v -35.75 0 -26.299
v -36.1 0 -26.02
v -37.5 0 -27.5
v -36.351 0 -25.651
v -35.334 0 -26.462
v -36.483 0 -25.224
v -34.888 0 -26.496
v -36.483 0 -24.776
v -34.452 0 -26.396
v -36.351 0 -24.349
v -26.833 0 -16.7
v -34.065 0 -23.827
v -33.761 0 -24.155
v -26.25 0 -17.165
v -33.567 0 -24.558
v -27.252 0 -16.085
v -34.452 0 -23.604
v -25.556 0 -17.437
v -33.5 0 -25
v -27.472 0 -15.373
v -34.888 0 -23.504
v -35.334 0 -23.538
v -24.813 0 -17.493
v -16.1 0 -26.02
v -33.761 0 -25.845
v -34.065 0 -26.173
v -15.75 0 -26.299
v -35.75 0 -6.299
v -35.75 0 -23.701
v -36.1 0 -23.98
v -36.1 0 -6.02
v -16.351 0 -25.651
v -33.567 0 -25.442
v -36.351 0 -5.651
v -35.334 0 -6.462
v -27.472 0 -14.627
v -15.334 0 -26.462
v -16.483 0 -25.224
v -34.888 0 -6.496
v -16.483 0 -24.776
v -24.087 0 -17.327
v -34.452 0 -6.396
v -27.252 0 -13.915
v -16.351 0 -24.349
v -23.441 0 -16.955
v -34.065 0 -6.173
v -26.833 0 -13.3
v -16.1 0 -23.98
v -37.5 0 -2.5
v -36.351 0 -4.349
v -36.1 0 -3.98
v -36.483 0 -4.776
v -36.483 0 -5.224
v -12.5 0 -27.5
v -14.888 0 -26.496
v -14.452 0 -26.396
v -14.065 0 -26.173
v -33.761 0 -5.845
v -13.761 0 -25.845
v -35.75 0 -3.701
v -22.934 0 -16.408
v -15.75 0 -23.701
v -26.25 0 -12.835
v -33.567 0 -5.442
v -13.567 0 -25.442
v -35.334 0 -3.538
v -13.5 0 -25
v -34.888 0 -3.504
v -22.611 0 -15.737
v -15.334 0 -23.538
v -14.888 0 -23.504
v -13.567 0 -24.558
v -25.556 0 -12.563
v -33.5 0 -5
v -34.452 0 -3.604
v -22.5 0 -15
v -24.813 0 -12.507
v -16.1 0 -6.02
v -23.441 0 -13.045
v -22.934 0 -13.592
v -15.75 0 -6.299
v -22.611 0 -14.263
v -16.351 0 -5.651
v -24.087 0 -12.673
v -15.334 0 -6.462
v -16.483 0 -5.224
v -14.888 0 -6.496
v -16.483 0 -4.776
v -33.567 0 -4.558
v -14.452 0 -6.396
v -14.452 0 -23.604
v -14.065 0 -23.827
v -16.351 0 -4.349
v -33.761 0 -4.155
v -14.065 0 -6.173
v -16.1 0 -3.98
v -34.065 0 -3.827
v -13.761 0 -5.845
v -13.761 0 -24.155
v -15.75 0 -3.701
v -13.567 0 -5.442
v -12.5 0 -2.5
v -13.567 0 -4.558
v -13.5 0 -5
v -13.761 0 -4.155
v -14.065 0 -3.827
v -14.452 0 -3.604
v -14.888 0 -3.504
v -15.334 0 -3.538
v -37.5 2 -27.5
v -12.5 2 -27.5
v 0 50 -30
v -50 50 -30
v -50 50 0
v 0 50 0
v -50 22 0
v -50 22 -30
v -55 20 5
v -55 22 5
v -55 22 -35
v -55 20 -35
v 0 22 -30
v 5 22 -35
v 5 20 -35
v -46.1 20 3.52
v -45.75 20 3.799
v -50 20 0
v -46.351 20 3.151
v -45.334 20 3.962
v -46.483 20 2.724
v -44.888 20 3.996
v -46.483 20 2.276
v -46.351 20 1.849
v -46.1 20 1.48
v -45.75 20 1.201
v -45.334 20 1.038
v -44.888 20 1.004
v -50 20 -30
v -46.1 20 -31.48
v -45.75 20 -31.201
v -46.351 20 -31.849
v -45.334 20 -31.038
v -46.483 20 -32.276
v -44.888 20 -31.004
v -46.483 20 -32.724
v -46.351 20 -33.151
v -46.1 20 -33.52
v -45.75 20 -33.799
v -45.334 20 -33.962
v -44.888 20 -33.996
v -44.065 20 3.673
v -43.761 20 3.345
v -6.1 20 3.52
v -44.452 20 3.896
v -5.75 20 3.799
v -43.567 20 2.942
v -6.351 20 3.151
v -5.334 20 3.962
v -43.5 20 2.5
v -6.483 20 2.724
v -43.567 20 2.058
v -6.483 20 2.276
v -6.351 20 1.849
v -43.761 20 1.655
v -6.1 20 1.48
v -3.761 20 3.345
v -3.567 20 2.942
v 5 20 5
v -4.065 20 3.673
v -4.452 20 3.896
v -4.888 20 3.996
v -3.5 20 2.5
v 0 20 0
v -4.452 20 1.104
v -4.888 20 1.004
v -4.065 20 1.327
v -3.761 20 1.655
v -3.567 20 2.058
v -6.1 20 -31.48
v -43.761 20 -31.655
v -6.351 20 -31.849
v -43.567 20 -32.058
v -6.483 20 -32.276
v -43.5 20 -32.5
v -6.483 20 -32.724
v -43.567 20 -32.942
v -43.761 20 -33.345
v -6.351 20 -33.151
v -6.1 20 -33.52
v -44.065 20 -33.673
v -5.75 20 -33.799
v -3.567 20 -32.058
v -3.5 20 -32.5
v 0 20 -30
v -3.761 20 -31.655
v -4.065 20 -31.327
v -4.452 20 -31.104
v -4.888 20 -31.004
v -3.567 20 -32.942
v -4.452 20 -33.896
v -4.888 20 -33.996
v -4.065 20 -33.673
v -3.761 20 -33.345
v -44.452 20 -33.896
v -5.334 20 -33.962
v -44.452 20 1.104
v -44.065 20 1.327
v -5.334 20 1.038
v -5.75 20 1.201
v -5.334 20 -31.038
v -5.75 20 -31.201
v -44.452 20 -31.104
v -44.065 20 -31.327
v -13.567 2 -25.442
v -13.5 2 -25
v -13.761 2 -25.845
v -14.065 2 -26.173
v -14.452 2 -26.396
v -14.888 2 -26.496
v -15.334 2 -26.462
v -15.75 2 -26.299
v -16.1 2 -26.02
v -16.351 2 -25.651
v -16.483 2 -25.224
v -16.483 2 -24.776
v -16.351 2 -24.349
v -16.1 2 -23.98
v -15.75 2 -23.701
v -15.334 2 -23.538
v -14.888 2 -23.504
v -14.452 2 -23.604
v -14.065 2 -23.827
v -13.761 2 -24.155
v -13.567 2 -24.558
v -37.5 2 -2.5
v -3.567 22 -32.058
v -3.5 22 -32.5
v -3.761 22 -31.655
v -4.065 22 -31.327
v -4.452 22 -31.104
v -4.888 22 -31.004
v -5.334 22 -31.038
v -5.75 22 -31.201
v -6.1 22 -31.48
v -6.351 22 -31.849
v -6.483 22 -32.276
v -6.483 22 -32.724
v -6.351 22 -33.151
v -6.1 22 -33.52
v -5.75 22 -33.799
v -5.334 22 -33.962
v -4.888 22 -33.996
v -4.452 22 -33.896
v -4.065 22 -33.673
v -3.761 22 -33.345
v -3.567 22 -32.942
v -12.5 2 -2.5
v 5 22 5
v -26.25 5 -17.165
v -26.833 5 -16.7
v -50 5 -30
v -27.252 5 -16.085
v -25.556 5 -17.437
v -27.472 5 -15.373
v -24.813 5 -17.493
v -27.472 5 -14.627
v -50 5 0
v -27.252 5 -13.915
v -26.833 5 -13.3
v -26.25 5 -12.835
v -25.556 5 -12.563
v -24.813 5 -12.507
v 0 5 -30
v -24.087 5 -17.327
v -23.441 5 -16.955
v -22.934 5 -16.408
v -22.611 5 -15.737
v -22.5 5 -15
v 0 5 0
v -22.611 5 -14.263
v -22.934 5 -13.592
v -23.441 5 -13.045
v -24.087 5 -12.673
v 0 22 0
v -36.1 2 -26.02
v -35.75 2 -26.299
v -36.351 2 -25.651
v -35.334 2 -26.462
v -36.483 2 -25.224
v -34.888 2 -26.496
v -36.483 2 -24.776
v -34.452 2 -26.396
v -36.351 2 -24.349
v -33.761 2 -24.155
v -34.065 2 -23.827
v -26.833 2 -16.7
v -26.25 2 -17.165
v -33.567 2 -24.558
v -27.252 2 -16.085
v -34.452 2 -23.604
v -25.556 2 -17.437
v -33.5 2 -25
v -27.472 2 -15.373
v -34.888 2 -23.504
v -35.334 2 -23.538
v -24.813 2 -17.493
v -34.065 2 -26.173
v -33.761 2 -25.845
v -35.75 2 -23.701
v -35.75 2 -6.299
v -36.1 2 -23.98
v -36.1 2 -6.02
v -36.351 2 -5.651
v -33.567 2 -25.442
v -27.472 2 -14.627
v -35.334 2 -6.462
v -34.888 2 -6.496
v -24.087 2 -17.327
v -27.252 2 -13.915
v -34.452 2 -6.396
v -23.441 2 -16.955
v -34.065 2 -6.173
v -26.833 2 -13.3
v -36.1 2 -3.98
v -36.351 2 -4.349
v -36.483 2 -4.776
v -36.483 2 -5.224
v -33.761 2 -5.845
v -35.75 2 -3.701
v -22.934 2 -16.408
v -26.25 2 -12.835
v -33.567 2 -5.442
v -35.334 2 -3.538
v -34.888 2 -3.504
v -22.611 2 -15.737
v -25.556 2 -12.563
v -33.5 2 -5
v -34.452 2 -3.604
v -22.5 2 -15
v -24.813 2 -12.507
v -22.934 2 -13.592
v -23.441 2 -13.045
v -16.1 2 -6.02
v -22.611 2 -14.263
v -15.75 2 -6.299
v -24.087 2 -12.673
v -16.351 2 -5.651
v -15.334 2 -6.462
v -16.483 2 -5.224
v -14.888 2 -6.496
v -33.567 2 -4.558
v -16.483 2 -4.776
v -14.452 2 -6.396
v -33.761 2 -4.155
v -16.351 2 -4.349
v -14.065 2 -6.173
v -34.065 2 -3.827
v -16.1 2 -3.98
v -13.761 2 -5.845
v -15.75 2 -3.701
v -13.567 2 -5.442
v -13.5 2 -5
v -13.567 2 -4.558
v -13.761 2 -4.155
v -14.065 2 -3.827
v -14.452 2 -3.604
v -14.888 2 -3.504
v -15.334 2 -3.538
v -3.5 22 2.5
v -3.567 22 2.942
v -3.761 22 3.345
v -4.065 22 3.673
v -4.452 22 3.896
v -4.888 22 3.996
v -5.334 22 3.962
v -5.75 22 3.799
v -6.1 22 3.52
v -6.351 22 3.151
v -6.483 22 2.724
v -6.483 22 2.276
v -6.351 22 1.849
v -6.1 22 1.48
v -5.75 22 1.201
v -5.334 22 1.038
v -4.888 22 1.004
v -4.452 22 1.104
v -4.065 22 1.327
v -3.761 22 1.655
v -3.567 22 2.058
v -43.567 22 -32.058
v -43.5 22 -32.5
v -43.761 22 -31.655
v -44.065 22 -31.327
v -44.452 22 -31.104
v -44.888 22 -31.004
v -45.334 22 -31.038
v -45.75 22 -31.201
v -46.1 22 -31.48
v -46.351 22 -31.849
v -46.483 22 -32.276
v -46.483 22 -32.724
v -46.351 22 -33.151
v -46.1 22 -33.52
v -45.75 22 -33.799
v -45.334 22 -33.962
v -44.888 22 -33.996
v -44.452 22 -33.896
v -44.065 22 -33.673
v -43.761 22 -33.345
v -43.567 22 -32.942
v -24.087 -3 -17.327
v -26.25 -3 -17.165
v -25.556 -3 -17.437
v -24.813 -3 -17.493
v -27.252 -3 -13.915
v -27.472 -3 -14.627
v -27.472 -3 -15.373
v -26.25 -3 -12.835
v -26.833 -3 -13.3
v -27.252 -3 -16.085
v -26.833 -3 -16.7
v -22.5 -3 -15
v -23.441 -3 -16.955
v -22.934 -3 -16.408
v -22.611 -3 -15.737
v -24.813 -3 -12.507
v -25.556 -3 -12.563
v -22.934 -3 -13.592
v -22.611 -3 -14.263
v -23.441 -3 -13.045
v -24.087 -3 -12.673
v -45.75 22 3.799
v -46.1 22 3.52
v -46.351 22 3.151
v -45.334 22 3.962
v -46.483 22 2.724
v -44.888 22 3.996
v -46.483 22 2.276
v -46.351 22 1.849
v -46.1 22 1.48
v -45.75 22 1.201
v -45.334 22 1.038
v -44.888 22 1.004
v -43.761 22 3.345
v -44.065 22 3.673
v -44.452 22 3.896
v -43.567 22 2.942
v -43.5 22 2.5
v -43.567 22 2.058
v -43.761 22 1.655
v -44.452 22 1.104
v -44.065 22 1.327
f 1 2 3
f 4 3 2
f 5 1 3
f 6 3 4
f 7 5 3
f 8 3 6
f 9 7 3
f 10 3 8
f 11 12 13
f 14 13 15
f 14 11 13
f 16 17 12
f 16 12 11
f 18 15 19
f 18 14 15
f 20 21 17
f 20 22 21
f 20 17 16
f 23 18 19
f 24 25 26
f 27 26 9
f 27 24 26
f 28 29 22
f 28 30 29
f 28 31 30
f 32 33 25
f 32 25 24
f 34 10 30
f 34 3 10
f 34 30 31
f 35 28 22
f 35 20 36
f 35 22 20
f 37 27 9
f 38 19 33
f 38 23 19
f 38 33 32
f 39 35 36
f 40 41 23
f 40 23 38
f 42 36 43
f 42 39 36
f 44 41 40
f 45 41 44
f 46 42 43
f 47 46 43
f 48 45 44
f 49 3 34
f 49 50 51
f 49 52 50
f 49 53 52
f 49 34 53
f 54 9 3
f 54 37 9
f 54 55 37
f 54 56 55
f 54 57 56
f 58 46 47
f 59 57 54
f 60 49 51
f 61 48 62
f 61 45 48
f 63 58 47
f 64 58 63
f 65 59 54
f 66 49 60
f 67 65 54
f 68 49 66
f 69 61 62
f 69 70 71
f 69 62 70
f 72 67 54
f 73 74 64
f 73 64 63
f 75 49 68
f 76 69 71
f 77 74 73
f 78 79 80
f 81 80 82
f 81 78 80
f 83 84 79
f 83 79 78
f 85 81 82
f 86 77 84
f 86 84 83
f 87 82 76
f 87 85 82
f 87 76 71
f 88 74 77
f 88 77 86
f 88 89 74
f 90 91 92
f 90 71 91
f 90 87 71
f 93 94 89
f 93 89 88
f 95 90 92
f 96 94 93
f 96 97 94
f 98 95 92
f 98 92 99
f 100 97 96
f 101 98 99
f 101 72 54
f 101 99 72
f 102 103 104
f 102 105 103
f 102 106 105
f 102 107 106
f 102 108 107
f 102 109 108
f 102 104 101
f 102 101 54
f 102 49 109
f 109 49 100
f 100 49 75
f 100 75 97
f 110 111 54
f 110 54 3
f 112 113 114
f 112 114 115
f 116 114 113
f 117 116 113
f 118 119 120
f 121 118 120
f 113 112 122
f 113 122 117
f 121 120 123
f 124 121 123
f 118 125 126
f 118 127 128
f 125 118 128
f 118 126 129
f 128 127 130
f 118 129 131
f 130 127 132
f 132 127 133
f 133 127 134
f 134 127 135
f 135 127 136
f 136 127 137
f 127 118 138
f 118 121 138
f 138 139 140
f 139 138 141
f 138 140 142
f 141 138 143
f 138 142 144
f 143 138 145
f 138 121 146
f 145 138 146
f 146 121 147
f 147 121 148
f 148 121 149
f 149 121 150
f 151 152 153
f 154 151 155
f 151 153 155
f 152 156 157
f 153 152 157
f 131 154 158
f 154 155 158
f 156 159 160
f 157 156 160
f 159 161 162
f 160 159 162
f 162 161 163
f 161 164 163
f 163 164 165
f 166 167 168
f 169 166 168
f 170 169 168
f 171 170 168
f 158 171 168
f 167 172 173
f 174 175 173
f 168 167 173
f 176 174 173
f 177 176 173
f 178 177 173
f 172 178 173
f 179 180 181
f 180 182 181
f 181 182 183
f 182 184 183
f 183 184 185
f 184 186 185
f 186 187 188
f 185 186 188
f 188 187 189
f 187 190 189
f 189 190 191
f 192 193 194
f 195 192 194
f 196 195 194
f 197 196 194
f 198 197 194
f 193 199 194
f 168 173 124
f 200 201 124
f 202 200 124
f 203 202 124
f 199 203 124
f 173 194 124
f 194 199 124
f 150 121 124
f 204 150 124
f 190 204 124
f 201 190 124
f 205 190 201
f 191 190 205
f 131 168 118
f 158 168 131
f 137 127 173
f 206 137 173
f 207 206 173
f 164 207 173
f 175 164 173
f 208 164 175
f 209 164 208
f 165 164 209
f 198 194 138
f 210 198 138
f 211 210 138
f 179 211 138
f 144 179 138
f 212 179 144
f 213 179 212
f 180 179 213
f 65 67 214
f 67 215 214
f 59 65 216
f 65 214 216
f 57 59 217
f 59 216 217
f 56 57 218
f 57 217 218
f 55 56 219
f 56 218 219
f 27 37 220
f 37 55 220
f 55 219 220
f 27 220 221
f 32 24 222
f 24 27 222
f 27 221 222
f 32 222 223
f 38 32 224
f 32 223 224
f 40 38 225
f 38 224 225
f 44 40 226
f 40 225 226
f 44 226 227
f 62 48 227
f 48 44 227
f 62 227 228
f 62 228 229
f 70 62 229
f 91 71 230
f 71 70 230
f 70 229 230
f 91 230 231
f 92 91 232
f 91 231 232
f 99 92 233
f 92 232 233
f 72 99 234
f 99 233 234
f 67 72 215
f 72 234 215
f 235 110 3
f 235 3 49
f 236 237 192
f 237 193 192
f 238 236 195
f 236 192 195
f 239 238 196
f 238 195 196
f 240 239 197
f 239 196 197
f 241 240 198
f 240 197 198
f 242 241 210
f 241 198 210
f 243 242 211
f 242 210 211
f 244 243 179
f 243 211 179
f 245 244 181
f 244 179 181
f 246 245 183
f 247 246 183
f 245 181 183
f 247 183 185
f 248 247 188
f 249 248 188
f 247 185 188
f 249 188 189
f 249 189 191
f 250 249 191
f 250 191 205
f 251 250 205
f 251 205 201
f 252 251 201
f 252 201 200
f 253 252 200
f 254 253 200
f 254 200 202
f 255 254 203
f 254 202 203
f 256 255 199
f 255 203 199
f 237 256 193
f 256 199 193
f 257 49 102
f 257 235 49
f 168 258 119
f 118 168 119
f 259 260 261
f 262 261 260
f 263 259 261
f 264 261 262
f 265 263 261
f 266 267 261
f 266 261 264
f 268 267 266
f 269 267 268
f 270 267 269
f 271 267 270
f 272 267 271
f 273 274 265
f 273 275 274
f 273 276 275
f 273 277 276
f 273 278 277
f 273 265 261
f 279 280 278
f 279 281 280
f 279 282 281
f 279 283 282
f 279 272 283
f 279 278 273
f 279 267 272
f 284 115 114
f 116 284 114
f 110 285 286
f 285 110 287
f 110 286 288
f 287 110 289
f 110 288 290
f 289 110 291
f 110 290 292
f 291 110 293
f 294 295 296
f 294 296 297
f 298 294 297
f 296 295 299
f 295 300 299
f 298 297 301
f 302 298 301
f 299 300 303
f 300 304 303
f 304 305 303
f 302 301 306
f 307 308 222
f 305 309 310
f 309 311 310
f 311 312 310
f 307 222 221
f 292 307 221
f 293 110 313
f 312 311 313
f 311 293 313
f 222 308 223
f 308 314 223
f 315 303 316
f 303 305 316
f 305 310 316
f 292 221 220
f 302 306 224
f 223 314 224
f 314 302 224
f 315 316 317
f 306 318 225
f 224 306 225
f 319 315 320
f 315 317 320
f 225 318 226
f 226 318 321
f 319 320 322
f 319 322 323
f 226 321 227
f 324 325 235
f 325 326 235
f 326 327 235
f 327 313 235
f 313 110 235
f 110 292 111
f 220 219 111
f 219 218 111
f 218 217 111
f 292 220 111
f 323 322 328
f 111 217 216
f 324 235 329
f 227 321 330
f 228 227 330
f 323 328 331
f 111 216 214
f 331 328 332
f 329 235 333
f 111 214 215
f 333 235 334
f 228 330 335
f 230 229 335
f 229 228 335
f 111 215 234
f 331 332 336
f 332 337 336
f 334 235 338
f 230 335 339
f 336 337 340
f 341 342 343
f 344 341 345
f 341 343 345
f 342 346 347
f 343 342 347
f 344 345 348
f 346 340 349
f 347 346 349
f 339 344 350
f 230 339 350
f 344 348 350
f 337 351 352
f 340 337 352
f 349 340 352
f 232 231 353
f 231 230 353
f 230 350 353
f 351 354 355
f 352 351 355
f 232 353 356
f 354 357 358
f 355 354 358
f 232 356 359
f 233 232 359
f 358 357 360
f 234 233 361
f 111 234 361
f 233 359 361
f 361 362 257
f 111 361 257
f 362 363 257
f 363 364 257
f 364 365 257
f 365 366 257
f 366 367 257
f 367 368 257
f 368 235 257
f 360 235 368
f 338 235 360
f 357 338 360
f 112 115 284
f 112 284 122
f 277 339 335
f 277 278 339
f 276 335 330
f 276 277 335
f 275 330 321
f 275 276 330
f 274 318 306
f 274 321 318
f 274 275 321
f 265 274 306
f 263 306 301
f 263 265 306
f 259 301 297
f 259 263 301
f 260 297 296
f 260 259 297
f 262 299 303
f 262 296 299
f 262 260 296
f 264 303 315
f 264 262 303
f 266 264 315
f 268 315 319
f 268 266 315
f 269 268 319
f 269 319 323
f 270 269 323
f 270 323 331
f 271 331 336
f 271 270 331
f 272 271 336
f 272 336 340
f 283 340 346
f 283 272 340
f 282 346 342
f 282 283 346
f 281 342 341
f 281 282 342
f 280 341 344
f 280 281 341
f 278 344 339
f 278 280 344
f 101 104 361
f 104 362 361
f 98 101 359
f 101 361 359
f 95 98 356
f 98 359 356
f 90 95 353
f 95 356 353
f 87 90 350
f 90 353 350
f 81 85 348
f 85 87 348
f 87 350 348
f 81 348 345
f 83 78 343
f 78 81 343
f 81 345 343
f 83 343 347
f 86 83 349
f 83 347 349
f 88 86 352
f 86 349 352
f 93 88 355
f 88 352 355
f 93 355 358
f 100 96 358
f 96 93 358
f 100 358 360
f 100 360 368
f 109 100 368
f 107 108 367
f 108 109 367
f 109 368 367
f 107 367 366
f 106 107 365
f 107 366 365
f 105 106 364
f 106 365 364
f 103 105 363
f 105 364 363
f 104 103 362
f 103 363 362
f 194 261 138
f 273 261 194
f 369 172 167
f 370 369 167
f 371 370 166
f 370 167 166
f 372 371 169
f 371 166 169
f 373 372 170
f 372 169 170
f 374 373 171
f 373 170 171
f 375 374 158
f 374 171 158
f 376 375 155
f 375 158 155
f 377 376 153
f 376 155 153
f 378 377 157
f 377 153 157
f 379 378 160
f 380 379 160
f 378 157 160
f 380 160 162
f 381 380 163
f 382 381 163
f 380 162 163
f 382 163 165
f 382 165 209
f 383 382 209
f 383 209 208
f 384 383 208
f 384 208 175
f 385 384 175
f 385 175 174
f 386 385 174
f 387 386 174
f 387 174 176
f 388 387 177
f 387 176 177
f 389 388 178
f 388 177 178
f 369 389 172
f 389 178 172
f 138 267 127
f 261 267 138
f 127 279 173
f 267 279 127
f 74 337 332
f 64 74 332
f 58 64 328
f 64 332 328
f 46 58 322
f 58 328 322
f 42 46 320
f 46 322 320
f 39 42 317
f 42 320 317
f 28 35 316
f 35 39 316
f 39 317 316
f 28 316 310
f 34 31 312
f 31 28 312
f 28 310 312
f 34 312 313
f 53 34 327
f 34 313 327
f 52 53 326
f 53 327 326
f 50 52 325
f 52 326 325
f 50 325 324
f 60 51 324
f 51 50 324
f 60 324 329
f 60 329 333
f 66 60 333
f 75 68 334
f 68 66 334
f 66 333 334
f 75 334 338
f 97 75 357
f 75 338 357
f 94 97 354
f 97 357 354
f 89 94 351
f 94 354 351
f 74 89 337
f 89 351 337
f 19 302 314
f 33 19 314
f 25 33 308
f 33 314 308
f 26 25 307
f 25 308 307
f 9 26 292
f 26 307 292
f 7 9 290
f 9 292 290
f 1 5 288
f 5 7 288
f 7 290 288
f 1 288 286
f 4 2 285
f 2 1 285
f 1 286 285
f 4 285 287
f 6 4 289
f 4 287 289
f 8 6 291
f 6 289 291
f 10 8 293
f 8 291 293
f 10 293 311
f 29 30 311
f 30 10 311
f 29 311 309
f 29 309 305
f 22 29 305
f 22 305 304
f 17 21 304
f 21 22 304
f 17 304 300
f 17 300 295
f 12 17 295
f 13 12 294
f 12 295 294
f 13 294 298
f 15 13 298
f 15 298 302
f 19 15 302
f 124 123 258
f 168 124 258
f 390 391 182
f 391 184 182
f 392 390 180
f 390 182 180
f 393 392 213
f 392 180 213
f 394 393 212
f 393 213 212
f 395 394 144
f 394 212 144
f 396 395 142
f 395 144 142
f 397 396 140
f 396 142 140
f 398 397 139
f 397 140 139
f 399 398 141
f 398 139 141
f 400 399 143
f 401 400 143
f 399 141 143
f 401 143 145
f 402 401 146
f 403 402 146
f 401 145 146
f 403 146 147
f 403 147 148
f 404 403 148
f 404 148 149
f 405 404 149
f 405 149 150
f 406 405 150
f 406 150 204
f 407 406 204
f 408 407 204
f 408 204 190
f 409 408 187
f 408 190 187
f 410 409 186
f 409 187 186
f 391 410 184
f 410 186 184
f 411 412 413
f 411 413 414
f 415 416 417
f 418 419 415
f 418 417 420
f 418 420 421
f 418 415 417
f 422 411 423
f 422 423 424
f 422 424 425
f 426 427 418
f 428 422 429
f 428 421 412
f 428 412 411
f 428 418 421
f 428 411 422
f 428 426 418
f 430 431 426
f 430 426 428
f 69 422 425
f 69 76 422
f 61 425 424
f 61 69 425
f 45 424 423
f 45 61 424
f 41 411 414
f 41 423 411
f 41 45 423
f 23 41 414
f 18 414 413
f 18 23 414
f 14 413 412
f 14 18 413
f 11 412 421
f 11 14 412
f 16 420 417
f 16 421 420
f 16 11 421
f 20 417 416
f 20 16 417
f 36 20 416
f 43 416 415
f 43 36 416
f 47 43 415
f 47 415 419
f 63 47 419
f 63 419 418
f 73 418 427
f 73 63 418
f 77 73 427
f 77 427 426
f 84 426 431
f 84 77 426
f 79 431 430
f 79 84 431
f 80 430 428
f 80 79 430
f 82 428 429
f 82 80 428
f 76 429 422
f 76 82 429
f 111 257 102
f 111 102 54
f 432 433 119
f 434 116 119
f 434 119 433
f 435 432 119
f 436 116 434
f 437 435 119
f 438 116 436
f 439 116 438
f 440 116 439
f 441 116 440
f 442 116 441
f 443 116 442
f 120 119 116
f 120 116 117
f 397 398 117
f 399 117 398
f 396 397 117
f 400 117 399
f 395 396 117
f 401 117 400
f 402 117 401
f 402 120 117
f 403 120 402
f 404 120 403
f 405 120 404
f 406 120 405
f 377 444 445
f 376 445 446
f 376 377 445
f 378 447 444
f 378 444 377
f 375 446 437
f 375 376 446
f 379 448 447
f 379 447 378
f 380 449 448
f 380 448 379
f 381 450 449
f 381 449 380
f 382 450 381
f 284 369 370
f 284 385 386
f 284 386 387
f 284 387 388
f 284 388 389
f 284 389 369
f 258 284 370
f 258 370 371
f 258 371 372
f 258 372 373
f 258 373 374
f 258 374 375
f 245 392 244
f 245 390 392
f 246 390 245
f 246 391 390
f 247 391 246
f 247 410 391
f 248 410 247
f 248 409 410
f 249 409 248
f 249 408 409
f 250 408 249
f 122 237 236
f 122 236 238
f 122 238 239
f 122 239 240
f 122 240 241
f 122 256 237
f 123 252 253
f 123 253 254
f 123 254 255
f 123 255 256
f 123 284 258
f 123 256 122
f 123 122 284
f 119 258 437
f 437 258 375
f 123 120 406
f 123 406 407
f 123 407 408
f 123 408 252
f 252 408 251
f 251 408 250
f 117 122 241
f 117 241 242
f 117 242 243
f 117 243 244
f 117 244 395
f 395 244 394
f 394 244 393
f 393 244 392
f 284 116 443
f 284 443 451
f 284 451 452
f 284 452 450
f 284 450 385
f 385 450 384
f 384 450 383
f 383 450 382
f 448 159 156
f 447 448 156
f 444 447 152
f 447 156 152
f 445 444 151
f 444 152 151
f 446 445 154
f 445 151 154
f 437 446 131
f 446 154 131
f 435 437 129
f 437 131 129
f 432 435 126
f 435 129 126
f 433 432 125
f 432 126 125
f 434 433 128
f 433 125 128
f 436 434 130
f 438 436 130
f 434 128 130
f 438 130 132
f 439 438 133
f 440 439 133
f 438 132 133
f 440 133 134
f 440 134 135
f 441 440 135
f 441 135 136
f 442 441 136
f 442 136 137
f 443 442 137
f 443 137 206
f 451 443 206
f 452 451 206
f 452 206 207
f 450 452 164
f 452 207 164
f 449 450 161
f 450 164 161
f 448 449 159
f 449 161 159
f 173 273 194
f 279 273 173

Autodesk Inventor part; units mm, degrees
ref_plane "YZ Plane" through (0, 0, 0) normal (1, 0, 0) x (0, 1, 0)
ref_plane "XZ Plane" through (0, 0, 0) normal (0, 1, 0) x (-1, 0, 0)
ref_plane "XY Plane" through (0, 0, 0) normal (0, 0, 1) x (1, 0, 0)
sketch "Sketch1" plane through (0, 0, 0) normal (0, 1, 0) x (-1, 0, 0)
  line L0 (0, 0) -> (50, 0)
  line L1 (50, 0) -> (50, -30)
  line L2 (50, -30) -> (0, -30)
  line L3 (0, -30) -> (0, 0)
  dimension "d0" = 50
  dimension "d1" = 30
extrude "Extrusion1" add sketch "Sketch1" along normal blind 50
sketch "Sketch2" plane through (0, 50, 0) normal (0, 1, 0) x (1, 0, 0)
  line L0 (5, -5) -> (-55, -5)
  line L1 (-55, -5) -> (-55, 35)
  line L2 (-55, 35) -> (5, 35)
  line L3 (5, 35) -> (5, -5)
  point P0 (0, 0)
  dimension "d4" = 60
  dimension "d5" = 40
extrude "Extrusion2" add sketch "Sketch2" against normal blind 30
sketch "Sketch3" plane through (0, 50, 0) normal (0, 1, 0) x (1, 0, 0)
  line L0 (0, 0) -> (0, 30) projected
  line L1 (0, 30) -> (-50, 30) projected
  line L2 (0, 0) -> (-50, 0)
  line L3 (-50, 0) -> (-50, 30)
  line L4 (-50, 30) -> (0, 30)
  line L5 (0, 30) -> (0, 0)
  line L6 (5, -5) -> (-55, -5) projected
  line L7 (-55, -5) -> (-55, 35) projected
  line L8 (5, -5) -> (-55, -5)
  line L9 (-55, -5) -> (-55, 35)
  line L10 (-55, 35) -> (5, 35)
  line L11 (5, 35) -> (5, -5)
  dimension "d8" = 50
  dimension "d9" = 30
extrude "Extrusion3" cut sketch "Sketch3" against normal blind 28
sketch "Sketch4" plane through (0, 0, 0) normal (0, -1, 0) x (1, 0, 0)
  line L0 (-50, 0) -> (0, 0) projected
  line L1 (0, -30) -> (-50, -30) projected
  line L2 (0, 0) -> (-50, 0)
  line L3 (-50, 0) -> (-50, -30)
  line L4 (-50, -30) -> (0, -30)
  line L5 (0, -30) -> (0, 0)
extrude "Extrusion4" cut sketch "Sketch4" against normal blind 5
sketch "Sketch5" plane through (0, 5, 0) normal (0, -1, 0) x (1, 0, 0)
  circle A0 centre (-25, -15) radius 2.5
  point P0 (0, 0)
  dimension "d14" = 5
extrude "Extrusion5" add sketch "Sketch5" along normal blind 3
sketch "Sketch6" plane through (-25, 2, -15) normal (0, -1, 0) x (1, 0, 0)
  line L0 (-12.5, 12.5) -> (12.5, 12.5)
  line L1 (12.5, 12.5) -> (12.5, -12.5)
  line L2 (12.5, -12.5) -> (-12.5, -12.5)
  line L3 (-12.5, -12.5) -> (-12.5, 12.5)
  circle A0 centre (-10, 10) radius 1.5
  circle A1 centre (-10, -10) radius 1.5
  circle A2 centre (10, -10) radius 1.5
  circle A3 centre (10, 10) radius 1.5
  point P0 (25, 15)
  dimension "d19" = 25
  dimension "d20" = 25
  dimension "d21" = 3
  dimension "d22" = 3
  dimension "d23" = 3
  dimension "d24" = 3
extrude "Extrusion6" add sketch "Sketch6" along normal blind 2
sketch "Sketch7" plane through (-25, 0, -15) normal (0, -1, 0) x (1, 0, 0)
  circle A0 centre (0, 0) radius 2.5
  point P0 (25, 15)
  dimension "d27" = 5
extrude "Extrusion7" add sketch "Sketch7" along normal blind 3
sketch "Sketch8" plane through (0, 20, 0) normal (0, -1, 0) x (1, 0, 0)
  line L0 (-50, -30) -> (-50, 0) projected
  circle A0 centre (-5, -32.5) radius 1.5
  circle A1 centre (-5, 2.5) radius 1.5
  circle A2 centre (-45, 2.5) radius 1.5
  circle A3 centre (-45, -32.5) radius 1.5
  point P0 (0, 0)
  point P1 (0, -30)
  dimension "d38" = 3
  dimension "d39" = 3
  dimension "d40" = 3
  dimension "d41" = 3
extrude "Extrusion8" cut sketch "Sketch8" against normal blind 3
properties part number "Servo"
